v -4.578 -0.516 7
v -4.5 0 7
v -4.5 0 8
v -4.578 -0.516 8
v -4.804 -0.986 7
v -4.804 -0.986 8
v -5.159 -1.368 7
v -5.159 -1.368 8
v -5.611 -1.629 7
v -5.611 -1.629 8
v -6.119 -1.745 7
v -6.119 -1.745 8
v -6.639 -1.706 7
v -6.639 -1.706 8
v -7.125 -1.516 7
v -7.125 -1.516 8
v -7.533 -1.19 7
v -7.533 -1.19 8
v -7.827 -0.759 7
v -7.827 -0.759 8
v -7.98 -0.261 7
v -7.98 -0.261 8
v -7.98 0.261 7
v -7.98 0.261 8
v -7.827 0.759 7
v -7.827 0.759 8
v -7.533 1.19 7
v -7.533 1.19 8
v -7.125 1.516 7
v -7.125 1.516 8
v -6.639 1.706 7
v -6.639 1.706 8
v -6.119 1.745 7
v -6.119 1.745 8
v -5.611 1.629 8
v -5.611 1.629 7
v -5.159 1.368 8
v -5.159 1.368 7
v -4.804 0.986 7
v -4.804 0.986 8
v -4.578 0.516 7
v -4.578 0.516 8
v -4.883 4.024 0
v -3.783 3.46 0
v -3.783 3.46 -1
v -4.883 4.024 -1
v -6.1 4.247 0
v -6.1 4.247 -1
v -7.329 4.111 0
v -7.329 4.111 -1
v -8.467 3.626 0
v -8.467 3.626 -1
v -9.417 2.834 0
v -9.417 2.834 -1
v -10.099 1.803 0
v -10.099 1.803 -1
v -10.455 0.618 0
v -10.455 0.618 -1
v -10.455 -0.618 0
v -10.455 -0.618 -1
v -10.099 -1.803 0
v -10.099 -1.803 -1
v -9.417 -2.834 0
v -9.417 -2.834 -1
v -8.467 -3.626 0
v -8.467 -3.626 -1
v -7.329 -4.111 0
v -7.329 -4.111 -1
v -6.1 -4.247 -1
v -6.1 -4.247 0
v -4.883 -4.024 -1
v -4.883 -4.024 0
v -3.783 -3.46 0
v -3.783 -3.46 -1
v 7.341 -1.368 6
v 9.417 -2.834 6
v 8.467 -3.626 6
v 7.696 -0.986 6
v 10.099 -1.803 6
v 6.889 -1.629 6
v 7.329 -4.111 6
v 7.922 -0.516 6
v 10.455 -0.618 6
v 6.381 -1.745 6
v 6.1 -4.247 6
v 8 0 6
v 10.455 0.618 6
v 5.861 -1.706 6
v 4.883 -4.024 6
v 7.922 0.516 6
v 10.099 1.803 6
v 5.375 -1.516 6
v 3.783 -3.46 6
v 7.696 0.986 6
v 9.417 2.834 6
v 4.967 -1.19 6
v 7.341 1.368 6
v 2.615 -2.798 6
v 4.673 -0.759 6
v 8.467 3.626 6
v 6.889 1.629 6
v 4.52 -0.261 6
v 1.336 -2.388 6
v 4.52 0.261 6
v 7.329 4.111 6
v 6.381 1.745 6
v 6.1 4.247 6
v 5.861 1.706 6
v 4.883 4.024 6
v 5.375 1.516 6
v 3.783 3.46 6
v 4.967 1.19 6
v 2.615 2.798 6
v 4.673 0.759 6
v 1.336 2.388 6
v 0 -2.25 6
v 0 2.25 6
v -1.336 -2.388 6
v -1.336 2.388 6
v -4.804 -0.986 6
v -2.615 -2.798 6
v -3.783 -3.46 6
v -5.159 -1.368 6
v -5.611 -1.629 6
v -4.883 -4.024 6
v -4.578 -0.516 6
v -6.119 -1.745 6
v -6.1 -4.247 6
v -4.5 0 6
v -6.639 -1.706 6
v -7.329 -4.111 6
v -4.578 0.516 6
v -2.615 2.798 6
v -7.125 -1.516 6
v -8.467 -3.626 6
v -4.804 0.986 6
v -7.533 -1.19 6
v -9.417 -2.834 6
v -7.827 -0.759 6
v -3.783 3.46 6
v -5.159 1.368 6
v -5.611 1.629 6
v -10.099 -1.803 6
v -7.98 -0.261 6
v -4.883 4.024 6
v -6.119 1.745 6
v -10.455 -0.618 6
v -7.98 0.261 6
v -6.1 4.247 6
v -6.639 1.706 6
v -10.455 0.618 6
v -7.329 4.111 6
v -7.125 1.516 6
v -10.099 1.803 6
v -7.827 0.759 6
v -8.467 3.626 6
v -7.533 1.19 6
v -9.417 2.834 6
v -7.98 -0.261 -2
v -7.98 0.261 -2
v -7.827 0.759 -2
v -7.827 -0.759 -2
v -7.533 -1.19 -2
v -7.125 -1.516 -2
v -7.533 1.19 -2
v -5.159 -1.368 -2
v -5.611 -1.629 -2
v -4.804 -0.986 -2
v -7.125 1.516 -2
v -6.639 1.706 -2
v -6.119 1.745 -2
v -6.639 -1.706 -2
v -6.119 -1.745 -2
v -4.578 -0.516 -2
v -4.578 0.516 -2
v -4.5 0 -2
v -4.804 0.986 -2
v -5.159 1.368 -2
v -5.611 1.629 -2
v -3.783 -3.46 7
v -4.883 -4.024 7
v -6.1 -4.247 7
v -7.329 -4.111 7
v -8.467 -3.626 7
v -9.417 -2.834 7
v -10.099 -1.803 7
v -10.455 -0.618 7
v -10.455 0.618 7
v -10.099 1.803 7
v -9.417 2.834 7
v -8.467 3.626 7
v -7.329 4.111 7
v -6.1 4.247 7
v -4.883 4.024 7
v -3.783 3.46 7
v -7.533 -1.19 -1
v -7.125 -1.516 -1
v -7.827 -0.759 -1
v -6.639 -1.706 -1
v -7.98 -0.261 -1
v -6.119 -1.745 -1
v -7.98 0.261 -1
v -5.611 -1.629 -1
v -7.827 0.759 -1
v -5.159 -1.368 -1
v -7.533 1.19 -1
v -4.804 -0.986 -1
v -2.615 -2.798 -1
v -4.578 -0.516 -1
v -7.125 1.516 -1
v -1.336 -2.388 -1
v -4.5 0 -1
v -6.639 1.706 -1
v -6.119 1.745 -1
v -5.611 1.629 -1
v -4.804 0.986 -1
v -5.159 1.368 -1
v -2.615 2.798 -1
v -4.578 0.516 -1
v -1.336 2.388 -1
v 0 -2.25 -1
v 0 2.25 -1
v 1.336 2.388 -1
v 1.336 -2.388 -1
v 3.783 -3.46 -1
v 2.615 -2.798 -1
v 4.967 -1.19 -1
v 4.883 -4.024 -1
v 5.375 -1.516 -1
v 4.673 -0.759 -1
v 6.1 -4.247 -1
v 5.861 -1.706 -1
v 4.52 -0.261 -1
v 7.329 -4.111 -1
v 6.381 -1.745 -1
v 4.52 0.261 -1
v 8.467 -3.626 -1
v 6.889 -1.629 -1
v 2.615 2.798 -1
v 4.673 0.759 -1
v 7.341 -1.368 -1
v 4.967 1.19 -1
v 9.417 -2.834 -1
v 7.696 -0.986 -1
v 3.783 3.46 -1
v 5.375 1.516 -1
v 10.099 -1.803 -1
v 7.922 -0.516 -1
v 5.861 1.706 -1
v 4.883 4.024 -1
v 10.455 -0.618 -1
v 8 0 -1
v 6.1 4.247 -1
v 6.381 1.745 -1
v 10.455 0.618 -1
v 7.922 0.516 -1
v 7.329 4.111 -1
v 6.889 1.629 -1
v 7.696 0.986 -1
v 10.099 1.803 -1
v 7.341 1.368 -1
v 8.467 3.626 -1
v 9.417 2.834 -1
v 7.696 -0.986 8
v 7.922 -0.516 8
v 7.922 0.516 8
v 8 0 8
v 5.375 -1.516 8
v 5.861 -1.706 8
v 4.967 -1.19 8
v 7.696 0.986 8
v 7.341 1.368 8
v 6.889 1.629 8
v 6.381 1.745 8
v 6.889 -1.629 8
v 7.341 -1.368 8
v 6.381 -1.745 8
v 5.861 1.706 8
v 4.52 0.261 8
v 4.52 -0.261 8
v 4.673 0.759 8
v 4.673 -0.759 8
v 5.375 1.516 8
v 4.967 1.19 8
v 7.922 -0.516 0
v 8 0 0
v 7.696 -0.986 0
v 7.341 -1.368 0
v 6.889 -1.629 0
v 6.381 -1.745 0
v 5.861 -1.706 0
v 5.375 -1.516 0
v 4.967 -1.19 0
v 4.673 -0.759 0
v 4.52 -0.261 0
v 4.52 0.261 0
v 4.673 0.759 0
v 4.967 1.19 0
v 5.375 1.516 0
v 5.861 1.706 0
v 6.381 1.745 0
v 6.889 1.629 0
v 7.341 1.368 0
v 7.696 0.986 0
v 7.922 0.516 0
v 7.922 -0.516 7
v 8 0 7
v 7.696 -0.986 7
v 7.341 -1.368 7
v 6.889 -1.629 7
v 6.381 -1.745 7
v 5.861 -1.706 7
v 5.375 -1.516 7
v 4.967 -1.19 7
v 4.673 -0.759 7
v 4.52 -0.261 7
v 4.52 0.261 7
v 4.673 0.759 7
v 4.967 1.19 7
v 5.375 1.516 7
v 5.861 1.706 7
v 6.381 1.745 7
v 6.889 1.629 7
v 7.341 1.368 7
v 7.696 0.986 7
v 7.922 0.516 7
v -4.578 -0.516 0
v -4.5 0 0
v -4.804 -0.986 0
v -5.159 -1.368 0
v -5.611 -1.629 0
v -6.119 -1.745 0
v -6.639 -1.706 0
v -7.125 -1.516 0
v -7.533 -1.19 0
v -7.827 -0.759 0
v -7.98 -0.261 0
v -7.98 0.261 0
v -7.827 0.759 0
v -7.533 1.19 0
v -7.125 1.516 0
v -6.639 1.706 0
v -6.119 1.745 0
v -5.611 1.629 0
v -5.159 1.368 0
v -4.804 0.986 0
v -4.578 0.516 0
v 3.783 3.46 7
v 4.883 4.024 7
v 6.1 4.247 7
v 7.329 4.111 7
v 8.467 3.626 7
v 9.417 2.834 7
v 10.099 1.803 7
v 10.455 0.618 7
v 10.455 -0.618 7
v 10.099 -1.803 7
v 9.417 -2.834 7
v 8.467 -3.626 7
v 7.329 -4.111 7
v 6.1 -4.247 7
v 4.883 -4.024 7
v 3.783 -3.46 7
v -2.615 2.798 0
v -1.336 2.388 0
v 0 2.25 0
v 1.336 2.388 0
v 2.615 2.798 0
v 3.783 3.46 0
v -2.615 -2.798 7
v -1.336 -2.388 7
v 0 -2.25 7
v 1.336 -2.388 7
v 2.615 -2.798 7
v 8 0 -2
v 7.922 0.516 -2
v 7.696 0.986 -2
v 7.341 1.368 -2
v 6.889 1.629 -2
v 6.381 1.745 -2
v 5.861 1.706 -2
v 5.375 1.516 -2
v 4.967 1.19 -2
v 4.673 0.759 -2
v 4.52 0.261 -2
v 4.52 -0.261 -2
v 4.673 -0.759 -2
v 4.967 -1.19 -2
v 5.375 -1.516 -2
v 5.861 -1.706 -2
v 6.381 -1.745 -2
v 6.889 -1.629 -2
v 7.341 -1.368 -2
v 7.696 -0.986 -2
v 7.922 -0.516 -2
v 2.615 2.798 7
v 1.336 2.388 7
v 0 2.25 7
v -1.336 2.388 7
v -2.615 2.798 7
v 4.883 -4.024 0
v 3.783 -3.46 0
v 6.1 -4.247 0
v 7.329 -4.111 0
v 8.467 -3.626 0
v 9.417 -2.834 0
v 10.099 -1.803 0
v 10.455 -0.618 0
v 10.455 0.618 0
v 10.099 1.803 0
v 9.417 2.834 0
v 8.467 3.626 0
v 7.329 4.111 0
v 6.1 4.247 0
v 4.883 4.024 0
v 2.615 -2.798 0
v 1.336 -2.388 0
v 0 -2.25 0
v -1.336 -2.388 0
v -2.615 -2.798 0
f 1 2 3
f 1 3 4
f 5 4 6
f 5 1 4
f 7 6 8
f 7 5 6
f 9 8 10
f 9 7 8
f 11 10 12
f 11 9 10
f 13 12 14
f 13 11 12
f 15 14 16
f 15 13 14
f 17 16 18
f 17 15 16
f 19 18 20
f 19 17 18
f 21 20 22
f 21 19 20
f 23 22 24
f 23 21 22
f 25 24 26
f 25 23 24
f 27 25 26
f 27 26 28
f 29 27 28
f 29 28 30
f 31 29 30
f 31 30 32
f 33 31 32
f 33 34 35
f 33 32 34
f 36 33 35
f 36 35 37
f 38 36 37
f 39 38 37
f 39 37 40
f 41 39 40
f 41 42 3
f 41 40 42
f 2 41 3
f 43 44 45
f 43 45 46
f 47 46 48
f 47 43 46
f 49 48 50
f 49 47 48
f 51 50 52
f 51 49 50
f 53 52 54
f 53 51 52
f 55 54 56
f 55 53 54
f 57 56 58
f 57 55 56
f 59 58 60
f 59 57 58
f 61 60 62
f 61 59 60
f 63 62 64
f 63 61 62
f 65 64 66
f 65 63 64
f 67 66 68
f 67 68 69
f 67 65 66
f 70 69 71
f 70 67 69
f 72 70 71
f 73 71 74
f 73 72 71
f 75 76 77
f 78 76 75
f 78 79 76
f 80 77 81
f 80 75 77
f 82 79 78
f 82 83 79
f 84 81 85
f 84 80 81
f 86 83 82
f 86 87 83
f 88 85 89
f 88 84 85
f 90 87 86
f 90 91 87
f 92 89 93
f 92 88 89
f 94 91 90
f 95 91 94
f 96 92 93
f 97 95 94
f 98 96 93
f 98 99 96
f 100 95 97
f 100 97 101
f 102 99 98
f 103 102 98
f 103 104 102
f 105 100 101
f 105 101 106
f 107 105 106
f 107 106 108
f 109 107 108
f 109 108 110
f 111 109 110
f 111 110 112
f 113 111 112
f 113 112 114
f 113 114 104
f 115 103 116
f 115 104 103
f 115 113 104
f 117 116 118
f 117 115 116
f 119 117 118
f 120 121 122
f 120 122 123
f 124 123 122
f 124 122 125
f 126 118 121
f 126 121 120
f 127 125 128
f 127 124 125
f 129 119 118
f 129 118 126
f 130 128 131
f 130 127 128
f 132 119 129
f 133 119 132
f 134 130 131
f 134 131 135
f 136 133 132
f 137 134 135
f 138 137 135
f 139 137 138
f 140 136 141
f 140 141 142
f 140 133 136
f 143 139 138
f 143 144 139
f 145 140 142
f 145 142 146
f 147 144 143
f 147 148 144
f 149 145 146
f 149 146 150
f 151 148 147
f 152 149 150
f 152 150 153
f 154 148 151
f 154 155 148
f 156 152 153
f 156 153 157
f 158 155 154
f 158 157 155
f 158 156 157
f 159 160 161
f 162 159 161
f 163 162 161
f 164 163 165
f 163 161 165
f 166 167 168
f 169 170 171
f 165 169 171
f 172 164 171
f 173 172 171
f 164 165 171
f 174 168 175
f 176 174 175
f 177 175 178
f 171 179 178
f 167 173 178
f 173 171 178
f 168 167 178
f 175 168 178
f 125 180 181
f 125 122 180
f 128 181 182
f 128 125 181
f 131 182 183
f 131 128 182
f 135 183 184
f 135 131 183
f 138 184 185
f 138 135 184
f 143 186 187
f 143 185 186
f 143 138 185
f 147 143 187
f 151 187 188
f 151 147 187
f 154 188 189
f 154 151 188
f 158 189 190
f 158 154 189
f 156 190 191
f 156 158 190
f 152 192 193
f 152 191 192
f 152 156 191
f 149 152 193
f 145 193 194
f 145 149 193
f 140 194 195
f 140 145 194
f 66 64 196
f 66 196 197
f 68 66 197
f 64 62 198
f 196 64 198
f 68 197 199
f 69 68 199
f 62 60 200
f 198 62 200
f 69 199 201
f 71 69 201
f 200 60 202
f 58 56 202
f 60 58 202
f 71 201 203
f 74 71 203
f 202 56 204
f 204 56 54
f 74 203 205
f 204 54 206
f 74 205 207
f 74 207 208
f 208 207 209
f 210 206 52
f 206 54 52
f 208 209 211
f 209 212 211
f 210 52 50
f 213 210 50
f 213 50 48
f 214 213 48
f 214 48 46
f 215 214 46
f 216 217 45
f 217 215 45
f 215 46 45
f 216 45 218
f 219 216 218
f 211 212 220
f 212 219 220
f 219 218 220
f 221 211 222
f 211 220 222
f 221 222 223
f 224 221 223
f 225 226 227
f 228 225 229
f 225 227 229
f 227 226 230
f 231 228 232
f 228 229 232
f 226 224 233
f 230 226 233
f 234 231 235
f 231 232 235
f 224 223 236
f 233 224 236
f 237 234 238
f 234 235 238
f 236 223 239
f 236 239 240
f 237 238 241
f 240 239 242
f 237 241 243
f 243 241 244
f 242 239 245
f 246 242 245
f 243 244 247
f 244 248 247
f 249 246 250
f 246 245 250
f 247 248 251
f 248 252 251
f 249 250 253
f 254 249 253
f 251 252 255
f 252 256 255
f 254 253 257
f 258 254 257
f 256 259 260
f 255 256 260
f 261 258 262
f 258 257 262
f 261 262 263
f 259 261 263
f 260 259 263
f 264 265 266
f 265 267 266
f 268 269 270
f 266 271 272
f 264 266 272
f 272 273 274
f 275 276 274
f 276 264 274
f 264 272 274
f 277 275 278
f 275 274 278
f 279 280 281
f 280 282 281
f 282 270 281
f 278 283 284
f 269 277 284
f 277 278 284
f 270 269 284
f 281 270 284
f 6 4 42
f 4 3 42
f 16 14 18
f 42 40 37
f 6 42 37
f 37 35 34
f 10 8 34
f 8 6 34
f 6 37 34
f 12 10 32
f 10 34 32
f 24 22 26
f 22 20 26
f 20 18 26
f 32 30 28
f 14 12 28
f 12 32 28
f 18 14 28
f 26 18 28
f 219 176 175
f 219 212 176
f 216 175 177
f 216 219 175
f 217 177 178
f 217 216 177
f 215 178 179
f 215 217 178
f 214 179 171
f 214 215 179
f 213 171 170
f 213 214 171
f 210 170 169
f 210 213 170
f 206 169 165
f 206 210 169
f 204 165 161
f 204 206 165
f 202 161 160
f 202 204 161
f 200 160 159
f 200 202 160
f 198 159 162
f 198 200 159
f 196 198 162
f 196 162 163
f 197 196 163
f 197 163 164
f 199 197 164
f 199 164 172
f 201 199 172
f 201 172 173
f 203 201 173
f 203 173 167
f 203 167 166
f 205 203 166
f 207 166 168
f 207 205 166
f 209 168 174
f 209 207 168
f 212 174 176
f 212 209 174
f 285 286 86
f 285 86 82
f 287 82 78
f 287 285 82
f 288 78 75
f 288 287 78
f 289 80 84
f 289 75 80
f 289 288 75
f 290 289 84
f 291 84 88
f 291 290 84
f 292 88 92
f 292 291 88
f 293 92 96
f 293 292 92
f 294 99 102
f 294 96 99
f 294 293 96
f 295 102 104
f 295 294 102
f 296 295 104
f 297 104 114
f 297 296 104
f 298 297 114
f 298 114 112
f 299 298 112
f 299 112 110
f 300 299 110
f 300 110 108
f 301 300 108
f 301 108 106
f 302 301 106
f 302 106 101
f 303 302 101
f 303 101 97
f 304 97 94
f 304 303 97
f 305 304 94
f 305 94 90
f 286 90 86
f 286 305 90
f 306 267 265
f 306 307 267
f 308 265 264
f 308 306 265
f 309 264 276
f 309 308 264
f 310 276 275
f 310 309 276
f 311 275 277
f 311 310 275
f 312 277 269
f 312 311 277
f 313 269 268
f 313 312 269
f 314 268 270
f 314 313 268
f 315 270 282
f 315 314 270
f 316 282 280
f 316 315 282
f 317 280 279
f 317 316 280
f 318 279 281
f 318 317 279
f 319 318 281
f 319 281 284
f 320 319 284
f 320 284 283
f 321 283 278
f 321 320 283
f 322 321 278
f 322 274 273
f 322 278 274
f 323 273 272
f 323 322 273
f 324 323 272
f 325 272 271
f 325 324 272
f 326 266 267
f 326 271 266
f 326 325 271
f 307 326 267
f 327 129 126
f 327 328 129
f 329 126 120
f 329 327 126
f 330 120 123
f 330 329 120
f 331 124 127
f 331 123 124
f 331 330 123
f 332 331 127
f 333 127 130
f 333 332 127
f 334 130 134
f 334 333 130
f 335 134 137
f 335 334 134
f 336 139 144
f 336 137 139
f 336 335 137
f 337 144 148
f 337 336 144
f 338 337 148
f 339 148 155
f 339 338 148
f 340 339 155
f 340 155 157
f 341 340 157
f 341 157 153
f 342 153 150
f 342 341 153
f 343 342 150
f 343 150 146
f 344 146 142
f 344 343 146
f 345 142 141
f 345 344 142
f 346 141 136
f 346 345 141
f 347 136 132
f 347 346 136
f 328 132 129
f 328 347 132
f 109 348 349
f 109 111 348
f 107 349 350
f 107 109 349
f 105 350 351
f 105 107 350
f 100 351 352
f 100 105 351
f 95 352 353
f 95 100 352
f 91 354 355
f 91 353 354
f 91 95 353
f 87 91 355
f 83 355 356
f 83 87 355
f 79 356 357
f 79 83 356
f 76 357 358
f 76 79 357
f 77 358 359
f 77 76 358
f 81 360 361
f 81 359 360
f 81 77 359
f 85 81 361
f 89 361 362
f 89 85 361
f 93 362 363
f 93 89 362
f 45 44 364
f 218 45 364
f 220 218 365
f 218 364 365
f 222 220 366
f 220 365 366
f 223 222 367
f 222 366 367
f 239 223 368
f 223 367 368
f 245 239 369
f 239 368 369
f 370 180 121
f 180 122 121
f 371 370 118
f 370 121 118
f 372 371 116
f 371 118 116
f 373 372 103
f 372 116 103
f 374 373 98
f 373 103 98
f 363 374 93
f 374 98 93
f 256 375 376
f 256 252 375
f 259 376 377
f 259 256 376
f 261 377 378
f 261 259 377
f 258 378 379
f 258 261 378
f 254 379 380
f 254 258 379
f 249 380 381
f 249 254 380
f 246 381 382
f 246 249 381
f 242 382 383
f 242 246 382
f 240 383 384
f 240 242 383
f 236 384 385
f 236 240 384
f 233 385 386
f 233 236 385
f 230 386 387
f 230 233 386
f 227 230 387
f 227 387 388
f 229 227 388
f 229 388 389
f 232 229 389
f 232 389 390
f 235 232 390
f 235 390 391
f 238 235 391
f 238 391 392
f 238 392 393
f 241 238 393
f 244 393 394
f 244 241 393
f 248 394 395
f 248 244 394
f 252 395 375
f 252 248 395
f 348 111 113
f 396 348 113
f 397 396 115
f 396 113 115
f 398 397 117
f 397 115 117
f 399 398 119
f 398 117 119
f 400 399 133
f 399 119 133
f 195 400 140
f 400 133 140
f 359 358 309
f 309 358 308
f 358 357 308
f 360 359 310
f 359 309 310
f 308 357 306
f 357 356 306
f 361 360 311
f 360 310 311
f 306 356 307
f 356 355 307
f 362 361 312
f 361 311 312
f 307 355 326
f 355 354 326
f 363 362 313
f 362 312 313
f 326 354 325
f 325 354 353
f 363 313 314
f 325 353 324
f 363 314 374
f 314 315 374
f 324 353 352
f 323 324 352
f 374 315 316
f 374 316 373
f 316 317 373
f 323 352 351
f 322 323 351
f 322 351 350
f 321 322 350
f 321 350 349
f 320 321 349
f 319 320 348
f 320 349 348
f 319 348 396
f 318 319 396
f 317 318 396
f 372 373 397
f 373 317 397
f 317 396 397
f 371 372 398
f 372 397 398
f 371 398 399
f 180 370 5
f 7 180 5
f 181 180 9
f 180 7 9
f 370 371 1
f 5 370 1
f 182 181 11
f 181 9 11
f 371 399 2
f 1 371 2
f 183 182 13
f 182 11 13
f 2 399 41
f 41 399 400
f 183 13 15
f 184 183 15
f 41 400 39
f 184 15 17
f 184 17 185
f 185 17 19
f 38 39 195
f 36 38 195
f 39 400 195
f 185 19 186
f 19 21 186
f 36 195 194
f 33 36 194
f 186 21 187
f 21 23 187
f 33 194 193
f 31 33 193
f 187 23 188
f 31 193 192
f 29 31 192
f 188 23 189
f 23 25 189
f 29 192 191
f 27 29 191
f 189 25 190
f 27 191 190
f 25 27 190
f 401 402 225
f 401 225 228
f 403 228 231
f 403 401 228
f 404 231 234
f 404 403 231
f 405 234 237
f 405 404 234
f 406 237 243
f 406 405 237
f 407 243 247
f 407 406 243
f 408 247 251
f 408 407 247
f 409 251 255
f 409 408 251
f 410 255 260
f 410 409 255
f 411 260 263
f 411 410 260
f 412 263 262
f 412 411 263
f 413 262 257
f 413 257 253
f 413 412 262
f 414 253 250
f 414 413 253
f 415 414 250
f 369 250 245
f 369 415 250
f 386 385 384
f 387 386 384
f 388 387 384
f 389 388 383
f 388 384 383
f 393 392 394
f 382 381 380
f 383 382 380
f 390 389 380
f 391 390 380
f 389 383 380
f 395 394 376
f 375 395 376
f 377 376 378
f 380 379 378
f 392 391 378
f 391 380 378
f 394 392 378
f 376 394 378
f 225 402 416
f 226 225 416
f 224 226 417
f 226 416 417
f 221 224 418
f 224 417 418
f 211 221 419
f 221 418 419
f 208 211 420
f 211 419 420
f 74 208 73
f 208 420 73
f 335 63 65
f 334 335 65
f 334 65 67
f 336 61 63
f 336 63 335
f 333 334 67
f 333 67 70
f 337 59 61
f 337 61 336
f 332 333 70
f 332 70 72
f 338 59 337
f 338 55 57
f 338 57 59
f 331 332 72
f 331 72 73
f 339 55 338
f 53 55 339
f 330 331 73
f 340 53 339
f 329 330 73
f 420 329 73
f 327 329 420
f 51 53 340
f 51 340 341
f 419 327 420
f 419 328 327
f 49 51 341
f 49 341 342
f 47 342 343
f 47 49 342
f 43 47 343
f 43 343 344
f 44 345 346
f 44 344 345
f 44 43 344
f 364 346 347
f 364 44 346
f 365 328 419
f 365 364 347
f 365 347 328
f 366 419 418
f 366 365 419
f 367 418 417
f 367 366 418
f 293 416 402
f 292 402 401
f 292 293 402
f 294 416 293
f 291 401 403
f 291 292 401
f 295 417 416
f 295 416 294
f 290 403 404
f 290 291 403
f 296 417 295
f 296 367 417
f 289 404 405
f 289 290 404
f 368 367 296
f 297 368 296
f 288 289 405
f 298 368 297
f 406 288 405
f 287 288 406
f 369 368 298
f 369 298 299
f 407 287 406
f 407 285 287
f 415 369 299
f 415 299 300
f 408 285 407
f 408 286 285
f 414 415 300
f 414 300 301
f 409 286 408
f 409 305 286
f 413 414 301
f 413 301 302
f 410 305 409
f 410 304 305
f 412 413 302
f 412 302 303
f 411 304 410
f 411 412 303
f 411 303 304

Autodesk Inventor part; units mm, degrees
ref_plane "YZ Plane" through (0, 0, 0) normal (1, 0, 0) x (0, 1, 0)
sketch "Sketch1" plane through (0, 0, 0) normal (0, 0, 1) x (1, 0, 0)
  arc A0 (-3.7827, 3.4604) -> (-3.7827, -3.4604) centre (-6.25, 0) ccw
  arc A1 (-3.7827, 3.4604) -> (3.7827, 3.4604) centre (0, 8.7656) ccw
  arc A2 (3.7827, -3.4604) -> (-3.7827, -3.4604) centre (0, -8.7656) ccw
  arc A3 (3.7827, -3.4604) -> (3.7827, 3.4604) centre (6.25, 0) ccw
  line L0 (0, 0) -> (0, 4.5286) construction
  circle A4 centre (-6.25, 0) radius 1.75
  circle A5 centre (6.25, 0) radius 1.75
  point P0 (0, 2.25)
  point P1 (0, -2.25)
  dimension "d0" = 4.5
  dimension "d2" = 8.5
  dimension "d4" = 8.5
  dimension "d5" = 12.5
  dimension "d6" = 3.5
  dimension "d7" = 3.5
extrude "Extrusion1" add sketch "Sketch1" against normal blind 1
extrude "Extrusion2" add sketch "Sketch1" against normal blind 2 contours A4 | A5
extrude "Extrusion3" add sketch "Sketch1" along normal blind 6 contours A4 | A5
ref_plane "Work Plane1" through (0, 0, 3) normal (0, 0, 1) x (1, 0, 0)
mirror "Mirror1" about plane through (0, 0, 3) normal (0, 0, 1) of "Extrusion1", "Extrusion2"
ref_plane "Work Plane2" through (0, -8.7656, 3) normal (0, 0, 1) x (1, 0, 0)
equation "\"d4\" = d2"
equation "\"d7\" = d6"
properties part number "Outer Chain"
